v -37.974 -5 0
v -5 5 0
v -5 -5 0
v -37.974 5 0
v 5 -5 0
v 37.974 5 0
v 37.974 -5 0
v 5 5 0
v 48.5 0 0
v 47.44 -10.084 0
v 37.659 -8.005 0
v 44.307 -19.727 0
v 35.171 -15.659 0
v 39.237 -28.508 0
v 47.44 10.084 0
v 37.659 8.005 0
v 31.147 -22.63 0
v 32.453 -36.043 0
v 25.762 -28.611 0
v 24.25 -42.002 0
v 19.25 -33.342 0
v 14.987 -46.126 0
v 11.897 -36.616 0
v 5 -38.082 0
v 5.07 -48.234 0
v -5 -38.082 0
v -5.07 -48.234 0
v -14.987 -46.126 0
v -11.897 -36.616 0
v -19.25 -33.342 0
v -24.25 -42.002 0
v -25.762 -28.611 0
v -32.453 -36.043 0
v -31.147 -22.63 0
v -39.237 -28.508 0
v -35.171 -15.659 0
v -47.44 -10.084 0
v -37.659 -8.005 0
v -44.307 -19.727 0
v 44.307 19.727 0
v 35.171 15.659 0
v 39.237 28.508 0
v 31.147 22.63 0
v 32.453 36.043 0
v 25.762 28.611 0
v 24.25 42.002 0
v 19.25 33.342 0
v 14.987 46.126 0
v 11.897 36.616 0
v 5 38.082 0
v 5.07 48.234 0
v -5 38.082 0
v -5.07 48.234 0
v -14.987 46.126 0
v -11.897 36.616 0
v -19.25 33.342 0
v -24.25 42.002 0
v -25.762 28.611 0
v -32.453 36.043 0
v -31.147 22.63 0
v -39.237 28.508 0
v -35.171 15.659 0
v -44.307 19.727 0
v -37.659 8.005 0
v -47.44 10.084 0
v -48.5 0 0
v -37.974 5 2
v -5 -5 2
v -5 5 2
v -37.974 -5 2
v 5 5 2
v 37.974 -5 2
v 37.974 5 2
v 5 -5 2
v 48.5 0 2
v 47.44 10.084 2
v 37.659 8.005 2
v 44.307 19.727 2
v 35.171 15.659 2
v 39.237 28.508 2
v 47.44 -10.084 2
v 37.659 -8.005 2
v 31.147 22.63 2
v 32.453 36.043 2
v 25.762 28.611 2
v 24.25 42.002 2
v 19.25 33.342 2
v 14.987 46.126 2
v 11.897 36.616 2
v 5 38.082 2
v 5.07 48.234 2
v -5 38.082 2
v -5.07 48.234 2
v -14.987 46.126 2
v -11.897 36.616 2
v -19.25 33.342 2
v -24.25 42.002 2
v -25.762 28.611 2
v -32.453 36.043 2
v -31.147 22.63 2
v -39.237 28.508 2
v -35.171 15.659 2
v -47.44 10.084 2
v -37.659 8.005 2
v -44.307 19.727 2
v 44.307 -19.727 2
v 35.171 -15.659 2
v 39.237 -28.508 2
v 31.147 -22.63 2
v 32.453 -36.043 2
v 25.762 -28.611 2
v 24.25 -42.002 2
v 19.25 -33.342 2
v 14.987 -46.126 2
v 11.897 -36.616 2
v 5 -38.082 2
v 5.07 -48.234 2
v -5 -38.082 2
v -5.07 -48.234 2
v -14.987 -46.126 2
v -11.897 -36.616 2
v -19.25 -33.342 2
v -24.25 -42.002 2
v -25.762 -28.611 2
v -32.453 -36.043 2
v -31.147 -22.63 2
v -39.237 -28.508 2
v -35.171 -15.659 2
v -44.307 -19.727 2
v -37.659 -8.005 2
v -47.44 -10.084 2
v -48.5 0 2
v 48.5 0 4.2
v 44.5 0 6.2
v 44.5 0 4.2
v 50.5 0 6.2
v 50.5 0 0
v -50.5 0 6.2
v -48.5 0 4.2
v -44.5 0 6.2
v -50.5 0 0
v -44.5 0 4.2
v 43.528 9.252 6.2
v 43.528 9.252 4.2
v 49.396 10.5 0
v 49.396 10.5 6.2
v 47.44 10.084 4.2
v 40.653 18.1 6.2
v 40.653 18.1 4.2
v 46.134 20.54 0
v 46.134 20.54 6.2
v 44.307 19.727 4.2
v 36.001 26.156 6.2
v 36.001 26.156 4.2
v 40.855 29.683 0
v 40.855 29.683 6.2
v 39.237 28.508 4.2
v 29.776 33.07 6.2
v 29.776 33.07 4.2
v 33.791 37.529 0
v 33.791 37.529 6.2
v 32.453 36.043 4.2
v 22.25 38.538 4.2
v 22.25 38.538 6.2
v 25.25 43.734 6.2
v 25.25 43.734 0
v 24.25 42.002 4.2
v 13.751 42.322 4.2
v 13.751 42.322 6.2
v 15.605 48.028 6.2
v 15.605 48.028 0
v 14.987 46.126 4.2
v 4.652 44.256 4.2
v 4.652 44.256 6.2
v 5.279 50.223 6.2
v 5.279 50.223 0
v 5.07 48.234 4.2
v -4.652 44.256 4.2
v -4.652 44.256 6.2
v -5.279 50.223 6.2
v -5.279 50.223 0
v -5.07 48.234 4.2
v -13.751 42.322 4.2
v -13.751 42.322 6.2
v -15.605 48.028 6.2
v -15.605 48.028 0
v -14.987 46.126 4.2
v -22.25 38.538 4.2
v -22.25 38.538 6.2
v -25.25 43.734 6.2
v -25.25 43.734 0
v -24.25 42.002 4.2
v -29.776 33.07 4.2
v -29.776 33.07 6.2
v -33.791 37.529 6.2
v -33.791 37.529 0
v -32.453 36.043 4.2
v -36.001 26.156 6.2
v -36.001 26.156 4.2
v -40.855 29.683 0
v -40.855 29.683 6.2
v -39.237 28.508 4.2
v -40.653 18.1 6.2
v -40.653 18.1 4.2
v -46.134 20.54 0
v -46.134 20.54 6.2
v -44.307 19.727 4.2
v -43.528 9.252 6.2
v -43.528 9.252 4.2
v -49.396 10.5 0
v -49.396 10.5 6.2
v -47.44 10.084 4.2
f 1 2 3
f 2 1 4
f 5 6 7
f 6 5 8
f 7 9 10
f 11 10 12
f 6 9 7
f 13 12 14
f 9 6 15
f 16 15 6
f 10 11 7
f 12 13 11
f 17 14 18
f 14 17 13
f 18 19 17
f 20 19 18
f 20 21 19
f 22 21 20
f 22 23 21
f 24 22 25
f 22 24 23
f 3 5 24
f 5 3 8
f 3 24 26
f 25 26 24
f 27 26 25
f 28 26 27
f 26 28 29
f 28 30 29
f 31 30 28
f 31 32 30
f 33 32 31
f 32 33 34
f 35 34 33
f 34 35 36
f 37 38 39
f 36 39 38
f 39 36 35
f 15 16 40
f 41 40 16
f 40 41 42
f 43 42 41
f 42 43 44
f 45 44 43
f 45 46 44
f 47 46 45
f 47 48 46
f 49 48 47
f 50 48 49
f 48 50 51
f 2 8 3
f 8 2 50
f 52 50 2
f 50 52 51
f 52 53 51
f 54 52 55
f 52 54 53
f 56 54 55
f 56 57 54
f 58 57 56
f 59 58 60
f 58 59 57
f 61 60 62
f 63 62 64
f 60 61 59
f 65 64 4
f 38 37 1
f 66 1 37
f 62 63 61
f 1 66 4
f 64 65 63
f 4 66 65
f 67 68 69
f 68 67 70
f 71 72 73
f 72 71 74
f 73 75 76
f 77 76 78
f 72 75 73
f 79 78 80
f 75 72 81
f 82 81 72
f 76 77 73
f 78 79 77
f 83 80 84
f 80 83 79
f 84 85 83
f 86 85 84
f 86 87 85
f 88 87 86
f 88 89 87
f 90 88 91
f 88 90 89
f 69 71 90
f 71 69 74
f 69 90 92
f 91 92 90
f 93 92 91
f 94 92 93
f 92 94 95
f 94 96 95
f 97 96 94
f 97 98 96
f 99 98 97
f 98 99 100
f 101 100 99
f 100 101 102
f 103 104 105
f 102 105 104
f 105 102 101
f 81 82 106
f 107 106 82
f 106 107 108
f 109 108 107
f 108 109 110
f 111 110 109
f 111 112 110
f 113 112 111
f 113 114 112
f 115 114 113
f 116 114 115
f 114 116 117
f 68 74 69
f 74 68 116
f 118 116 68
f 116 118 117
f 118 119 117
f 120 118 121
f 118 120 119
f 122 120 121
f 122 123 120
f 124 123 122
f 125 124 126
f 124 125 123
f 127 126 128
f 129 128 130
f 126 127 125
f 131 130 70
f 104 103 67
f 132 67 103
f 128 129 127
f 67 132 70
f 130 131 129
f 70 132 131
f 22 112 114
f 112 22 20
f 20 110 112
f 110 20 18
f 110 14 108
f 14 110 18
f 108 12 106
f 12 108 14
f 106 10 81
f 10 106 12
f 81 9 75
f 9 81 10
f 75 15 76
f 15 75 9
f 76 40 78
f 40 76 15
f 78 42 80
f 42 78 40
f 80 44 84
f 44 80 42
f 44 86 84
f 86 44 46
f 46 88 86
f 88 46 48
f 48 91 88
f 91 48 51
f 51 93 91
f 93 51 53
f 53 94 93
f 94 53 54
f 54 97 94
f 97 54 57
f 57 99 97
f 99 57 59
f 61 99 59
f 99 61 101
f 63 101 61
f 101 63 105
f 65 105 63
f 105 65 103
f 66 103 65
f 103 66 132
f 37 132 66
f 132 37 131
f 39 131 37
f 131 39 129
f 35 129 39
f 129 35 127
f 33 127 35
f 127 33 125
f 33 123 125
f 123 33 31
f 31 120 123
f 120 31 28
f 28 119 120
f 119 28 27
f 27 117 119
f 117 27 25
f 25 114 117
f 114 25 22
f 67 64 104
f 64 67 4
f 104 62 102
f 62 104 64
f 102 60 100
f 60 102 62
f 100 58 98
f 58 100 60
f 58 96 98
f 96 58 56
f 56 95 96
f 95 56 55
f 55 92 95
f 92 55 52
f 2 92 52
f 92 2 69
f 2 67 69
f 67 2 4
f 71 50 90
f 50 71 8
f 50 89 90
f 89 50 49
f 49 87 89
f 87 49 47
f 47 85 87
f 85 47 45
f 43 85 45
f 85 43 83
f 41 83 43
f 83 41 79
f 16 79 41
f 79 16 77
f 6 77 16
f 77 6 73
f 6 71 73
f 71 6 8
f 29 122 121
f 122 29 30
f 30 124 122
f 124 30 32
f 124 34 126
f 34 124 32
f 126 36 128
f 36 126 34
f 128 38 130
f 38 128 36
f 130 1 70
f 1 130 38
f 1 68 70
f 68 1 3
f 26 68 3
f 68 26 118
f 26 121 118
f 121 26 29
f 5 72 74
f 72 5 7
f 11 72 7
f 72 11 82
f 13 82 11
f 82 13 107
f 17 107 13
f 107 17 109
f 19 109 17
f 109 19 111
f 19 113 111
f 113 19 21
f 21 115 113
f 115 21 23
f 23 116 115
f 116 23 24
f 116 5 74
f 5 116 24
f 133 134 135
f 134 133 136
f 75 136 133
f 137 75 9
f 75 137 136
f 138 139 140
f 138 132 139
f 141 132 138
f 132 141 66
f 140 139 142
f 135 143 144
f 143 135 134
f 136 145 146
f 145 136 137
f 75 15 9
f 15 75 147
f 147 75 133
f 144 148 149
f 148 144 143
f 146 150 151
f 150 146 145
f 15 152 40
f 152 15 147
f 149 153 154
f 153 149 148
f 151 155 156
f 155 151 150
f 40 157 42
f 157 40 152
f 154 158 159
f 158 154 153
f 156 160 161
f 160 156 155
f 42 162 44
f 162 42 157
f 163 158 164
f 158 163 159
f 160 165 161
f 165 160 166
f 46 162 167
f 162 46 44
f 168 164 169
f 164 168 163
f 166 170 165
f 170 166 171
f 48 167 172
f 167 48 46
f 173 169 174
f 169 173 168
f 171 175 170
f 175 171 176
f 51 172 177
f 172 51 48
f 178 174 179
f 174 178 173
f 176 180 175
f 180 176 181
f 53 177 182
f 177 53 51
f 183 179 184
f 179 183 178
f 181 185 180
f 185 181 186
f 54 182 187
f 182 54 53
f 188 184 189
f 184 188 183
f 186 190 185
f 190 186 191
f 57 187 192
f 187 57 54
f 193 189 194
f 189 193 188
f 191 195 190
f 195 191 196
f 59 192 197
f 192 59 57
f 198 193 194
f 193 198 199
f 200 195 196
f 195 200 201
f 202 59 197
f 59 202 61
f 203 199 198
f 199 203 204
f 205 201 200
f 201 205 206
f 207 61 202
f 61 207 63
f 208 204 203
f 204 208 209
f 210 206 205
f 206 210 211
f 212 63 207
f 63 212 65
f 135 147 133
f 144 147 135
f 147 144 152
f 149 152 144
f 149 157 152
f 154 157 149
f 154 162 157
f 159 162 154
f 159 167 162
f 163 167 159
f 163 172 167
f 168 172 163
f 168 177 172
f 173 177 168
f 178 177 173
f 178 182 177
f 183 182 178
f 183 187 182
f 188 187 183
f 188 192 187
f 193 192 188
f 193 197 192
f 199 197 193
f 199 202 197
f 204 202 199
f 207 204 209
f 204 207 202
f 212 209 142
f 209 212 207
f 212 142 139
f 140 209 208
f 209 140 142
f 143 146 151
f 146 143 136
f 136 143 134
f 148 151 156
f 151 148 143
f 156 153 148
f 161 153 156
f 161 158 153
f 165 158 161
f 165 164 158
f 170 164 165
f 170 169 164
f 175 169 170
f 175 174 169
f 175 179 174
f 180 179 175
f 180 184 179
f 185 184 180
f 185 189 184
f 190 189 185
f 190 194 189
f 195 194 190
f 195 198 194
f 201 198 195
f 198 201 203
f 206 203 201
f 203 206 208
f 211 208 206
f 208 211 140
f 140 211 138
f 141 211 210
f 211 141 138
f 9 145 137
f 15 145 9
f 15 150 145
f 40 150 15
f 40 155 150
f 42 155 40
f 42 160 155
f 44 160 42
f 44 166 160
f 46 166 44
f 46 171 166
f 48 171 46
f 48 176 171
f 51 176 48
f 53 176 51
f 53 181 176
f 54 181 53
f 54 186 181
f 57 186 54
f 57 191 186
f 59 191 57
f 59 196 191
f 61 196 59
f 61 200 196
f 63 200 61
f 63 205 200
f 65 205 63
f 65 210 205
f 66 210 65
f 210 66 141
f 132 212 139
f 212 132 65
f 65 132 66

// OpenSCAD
// Jabra Speak 510

function jabra510_footplate_diameter() = 96; // mm
function jabra510_footplate_edge_thickness() = 2;
function jabra510_groove_diameter() = 71;
function jabra510_groove_height() = 5;

function jabra510_footplate_holder_thickness() = 2;
function jabra510_footplate_holder_groove_depth() = 4;

function jabra510_footplate_holder_tolerance_x() = 0.5; // provide somewhat loose fit
function jabra510_footplate_holder_tolerance_y() = 0.2; // provide somewhat loose fit


footplate_radius = jabra510_footplate_diameter() / 2 + jabra510_footplate_holder_tolerance_x();
hollow_footplate_outer_skirt_width = 10;
hollow_footplate_spoke_width = 10;

module jabra510_footplate_holder_cross_section() {    
    vertical_section_height = jabra510_footplate_holder_thickness() *  2 + jabra510_footplate_holder_tolerance_y();
    
    clamp_section_width = jabra510_footplate_holder_groove_depth() + jabra510_footplate_holder_thickness();
    clamp_section_x = footplate_radius - jabra510_footplate_holder_groove_depth();
    clamp_section_y = jabra510_footplate_holder_thickness() + jabra510_footplate_edge_thickness() + jabra510_footplate_holder_tolerance_y();
    
    echo("Vertical section height: ", vertical_section_height);
    
    union() {
        // square([footplate_radius, jabra510_footplate_holder_thickness()]);
        translate([footplate_radius, 0, 0]) square([jabra510_footplate_holder_thickness(), vertical_section_height]);
        translate([clamp_section_x, clamp_section_y, 0]) square([clamp_section_width, jabra510_footplate_holder_thickness()]);
    }
}

module jabra510_footplate_cutout() {
    r = footplate_radius - hollow_footplate_outer_skirt_width;
    
    difference() {
        circle(r = r);
        square([2 * r, hollow_footplate_spoke_width], center = true);
        square([hollow_footplate_spoke_width, 2 * r], center = true);
    }
}

module jabra510_hollow_footplate() {
    linear_extrude(jabra510_footplate_holder_thickness())
    difference() {
        circle(r = footplate_radius);
        jabra510_footplate_cutout();
    }
    // cylinder(h = jabra510_footplate_holder_thickness(), r = footplate_radius);
}

module jabra510_footplate_holder(groove_angle = 180) {
    groove_rotate = (180 - groove_angle) / 2;
    
    union() {
        jabra510_hollow_footplate();
        rotate([0, 0, groove_rotate]) rotate_extrude(angle = groove_angle) jabra510_footplate_holder_cross_section();
    }
}

jabra510_footplate_holder();
